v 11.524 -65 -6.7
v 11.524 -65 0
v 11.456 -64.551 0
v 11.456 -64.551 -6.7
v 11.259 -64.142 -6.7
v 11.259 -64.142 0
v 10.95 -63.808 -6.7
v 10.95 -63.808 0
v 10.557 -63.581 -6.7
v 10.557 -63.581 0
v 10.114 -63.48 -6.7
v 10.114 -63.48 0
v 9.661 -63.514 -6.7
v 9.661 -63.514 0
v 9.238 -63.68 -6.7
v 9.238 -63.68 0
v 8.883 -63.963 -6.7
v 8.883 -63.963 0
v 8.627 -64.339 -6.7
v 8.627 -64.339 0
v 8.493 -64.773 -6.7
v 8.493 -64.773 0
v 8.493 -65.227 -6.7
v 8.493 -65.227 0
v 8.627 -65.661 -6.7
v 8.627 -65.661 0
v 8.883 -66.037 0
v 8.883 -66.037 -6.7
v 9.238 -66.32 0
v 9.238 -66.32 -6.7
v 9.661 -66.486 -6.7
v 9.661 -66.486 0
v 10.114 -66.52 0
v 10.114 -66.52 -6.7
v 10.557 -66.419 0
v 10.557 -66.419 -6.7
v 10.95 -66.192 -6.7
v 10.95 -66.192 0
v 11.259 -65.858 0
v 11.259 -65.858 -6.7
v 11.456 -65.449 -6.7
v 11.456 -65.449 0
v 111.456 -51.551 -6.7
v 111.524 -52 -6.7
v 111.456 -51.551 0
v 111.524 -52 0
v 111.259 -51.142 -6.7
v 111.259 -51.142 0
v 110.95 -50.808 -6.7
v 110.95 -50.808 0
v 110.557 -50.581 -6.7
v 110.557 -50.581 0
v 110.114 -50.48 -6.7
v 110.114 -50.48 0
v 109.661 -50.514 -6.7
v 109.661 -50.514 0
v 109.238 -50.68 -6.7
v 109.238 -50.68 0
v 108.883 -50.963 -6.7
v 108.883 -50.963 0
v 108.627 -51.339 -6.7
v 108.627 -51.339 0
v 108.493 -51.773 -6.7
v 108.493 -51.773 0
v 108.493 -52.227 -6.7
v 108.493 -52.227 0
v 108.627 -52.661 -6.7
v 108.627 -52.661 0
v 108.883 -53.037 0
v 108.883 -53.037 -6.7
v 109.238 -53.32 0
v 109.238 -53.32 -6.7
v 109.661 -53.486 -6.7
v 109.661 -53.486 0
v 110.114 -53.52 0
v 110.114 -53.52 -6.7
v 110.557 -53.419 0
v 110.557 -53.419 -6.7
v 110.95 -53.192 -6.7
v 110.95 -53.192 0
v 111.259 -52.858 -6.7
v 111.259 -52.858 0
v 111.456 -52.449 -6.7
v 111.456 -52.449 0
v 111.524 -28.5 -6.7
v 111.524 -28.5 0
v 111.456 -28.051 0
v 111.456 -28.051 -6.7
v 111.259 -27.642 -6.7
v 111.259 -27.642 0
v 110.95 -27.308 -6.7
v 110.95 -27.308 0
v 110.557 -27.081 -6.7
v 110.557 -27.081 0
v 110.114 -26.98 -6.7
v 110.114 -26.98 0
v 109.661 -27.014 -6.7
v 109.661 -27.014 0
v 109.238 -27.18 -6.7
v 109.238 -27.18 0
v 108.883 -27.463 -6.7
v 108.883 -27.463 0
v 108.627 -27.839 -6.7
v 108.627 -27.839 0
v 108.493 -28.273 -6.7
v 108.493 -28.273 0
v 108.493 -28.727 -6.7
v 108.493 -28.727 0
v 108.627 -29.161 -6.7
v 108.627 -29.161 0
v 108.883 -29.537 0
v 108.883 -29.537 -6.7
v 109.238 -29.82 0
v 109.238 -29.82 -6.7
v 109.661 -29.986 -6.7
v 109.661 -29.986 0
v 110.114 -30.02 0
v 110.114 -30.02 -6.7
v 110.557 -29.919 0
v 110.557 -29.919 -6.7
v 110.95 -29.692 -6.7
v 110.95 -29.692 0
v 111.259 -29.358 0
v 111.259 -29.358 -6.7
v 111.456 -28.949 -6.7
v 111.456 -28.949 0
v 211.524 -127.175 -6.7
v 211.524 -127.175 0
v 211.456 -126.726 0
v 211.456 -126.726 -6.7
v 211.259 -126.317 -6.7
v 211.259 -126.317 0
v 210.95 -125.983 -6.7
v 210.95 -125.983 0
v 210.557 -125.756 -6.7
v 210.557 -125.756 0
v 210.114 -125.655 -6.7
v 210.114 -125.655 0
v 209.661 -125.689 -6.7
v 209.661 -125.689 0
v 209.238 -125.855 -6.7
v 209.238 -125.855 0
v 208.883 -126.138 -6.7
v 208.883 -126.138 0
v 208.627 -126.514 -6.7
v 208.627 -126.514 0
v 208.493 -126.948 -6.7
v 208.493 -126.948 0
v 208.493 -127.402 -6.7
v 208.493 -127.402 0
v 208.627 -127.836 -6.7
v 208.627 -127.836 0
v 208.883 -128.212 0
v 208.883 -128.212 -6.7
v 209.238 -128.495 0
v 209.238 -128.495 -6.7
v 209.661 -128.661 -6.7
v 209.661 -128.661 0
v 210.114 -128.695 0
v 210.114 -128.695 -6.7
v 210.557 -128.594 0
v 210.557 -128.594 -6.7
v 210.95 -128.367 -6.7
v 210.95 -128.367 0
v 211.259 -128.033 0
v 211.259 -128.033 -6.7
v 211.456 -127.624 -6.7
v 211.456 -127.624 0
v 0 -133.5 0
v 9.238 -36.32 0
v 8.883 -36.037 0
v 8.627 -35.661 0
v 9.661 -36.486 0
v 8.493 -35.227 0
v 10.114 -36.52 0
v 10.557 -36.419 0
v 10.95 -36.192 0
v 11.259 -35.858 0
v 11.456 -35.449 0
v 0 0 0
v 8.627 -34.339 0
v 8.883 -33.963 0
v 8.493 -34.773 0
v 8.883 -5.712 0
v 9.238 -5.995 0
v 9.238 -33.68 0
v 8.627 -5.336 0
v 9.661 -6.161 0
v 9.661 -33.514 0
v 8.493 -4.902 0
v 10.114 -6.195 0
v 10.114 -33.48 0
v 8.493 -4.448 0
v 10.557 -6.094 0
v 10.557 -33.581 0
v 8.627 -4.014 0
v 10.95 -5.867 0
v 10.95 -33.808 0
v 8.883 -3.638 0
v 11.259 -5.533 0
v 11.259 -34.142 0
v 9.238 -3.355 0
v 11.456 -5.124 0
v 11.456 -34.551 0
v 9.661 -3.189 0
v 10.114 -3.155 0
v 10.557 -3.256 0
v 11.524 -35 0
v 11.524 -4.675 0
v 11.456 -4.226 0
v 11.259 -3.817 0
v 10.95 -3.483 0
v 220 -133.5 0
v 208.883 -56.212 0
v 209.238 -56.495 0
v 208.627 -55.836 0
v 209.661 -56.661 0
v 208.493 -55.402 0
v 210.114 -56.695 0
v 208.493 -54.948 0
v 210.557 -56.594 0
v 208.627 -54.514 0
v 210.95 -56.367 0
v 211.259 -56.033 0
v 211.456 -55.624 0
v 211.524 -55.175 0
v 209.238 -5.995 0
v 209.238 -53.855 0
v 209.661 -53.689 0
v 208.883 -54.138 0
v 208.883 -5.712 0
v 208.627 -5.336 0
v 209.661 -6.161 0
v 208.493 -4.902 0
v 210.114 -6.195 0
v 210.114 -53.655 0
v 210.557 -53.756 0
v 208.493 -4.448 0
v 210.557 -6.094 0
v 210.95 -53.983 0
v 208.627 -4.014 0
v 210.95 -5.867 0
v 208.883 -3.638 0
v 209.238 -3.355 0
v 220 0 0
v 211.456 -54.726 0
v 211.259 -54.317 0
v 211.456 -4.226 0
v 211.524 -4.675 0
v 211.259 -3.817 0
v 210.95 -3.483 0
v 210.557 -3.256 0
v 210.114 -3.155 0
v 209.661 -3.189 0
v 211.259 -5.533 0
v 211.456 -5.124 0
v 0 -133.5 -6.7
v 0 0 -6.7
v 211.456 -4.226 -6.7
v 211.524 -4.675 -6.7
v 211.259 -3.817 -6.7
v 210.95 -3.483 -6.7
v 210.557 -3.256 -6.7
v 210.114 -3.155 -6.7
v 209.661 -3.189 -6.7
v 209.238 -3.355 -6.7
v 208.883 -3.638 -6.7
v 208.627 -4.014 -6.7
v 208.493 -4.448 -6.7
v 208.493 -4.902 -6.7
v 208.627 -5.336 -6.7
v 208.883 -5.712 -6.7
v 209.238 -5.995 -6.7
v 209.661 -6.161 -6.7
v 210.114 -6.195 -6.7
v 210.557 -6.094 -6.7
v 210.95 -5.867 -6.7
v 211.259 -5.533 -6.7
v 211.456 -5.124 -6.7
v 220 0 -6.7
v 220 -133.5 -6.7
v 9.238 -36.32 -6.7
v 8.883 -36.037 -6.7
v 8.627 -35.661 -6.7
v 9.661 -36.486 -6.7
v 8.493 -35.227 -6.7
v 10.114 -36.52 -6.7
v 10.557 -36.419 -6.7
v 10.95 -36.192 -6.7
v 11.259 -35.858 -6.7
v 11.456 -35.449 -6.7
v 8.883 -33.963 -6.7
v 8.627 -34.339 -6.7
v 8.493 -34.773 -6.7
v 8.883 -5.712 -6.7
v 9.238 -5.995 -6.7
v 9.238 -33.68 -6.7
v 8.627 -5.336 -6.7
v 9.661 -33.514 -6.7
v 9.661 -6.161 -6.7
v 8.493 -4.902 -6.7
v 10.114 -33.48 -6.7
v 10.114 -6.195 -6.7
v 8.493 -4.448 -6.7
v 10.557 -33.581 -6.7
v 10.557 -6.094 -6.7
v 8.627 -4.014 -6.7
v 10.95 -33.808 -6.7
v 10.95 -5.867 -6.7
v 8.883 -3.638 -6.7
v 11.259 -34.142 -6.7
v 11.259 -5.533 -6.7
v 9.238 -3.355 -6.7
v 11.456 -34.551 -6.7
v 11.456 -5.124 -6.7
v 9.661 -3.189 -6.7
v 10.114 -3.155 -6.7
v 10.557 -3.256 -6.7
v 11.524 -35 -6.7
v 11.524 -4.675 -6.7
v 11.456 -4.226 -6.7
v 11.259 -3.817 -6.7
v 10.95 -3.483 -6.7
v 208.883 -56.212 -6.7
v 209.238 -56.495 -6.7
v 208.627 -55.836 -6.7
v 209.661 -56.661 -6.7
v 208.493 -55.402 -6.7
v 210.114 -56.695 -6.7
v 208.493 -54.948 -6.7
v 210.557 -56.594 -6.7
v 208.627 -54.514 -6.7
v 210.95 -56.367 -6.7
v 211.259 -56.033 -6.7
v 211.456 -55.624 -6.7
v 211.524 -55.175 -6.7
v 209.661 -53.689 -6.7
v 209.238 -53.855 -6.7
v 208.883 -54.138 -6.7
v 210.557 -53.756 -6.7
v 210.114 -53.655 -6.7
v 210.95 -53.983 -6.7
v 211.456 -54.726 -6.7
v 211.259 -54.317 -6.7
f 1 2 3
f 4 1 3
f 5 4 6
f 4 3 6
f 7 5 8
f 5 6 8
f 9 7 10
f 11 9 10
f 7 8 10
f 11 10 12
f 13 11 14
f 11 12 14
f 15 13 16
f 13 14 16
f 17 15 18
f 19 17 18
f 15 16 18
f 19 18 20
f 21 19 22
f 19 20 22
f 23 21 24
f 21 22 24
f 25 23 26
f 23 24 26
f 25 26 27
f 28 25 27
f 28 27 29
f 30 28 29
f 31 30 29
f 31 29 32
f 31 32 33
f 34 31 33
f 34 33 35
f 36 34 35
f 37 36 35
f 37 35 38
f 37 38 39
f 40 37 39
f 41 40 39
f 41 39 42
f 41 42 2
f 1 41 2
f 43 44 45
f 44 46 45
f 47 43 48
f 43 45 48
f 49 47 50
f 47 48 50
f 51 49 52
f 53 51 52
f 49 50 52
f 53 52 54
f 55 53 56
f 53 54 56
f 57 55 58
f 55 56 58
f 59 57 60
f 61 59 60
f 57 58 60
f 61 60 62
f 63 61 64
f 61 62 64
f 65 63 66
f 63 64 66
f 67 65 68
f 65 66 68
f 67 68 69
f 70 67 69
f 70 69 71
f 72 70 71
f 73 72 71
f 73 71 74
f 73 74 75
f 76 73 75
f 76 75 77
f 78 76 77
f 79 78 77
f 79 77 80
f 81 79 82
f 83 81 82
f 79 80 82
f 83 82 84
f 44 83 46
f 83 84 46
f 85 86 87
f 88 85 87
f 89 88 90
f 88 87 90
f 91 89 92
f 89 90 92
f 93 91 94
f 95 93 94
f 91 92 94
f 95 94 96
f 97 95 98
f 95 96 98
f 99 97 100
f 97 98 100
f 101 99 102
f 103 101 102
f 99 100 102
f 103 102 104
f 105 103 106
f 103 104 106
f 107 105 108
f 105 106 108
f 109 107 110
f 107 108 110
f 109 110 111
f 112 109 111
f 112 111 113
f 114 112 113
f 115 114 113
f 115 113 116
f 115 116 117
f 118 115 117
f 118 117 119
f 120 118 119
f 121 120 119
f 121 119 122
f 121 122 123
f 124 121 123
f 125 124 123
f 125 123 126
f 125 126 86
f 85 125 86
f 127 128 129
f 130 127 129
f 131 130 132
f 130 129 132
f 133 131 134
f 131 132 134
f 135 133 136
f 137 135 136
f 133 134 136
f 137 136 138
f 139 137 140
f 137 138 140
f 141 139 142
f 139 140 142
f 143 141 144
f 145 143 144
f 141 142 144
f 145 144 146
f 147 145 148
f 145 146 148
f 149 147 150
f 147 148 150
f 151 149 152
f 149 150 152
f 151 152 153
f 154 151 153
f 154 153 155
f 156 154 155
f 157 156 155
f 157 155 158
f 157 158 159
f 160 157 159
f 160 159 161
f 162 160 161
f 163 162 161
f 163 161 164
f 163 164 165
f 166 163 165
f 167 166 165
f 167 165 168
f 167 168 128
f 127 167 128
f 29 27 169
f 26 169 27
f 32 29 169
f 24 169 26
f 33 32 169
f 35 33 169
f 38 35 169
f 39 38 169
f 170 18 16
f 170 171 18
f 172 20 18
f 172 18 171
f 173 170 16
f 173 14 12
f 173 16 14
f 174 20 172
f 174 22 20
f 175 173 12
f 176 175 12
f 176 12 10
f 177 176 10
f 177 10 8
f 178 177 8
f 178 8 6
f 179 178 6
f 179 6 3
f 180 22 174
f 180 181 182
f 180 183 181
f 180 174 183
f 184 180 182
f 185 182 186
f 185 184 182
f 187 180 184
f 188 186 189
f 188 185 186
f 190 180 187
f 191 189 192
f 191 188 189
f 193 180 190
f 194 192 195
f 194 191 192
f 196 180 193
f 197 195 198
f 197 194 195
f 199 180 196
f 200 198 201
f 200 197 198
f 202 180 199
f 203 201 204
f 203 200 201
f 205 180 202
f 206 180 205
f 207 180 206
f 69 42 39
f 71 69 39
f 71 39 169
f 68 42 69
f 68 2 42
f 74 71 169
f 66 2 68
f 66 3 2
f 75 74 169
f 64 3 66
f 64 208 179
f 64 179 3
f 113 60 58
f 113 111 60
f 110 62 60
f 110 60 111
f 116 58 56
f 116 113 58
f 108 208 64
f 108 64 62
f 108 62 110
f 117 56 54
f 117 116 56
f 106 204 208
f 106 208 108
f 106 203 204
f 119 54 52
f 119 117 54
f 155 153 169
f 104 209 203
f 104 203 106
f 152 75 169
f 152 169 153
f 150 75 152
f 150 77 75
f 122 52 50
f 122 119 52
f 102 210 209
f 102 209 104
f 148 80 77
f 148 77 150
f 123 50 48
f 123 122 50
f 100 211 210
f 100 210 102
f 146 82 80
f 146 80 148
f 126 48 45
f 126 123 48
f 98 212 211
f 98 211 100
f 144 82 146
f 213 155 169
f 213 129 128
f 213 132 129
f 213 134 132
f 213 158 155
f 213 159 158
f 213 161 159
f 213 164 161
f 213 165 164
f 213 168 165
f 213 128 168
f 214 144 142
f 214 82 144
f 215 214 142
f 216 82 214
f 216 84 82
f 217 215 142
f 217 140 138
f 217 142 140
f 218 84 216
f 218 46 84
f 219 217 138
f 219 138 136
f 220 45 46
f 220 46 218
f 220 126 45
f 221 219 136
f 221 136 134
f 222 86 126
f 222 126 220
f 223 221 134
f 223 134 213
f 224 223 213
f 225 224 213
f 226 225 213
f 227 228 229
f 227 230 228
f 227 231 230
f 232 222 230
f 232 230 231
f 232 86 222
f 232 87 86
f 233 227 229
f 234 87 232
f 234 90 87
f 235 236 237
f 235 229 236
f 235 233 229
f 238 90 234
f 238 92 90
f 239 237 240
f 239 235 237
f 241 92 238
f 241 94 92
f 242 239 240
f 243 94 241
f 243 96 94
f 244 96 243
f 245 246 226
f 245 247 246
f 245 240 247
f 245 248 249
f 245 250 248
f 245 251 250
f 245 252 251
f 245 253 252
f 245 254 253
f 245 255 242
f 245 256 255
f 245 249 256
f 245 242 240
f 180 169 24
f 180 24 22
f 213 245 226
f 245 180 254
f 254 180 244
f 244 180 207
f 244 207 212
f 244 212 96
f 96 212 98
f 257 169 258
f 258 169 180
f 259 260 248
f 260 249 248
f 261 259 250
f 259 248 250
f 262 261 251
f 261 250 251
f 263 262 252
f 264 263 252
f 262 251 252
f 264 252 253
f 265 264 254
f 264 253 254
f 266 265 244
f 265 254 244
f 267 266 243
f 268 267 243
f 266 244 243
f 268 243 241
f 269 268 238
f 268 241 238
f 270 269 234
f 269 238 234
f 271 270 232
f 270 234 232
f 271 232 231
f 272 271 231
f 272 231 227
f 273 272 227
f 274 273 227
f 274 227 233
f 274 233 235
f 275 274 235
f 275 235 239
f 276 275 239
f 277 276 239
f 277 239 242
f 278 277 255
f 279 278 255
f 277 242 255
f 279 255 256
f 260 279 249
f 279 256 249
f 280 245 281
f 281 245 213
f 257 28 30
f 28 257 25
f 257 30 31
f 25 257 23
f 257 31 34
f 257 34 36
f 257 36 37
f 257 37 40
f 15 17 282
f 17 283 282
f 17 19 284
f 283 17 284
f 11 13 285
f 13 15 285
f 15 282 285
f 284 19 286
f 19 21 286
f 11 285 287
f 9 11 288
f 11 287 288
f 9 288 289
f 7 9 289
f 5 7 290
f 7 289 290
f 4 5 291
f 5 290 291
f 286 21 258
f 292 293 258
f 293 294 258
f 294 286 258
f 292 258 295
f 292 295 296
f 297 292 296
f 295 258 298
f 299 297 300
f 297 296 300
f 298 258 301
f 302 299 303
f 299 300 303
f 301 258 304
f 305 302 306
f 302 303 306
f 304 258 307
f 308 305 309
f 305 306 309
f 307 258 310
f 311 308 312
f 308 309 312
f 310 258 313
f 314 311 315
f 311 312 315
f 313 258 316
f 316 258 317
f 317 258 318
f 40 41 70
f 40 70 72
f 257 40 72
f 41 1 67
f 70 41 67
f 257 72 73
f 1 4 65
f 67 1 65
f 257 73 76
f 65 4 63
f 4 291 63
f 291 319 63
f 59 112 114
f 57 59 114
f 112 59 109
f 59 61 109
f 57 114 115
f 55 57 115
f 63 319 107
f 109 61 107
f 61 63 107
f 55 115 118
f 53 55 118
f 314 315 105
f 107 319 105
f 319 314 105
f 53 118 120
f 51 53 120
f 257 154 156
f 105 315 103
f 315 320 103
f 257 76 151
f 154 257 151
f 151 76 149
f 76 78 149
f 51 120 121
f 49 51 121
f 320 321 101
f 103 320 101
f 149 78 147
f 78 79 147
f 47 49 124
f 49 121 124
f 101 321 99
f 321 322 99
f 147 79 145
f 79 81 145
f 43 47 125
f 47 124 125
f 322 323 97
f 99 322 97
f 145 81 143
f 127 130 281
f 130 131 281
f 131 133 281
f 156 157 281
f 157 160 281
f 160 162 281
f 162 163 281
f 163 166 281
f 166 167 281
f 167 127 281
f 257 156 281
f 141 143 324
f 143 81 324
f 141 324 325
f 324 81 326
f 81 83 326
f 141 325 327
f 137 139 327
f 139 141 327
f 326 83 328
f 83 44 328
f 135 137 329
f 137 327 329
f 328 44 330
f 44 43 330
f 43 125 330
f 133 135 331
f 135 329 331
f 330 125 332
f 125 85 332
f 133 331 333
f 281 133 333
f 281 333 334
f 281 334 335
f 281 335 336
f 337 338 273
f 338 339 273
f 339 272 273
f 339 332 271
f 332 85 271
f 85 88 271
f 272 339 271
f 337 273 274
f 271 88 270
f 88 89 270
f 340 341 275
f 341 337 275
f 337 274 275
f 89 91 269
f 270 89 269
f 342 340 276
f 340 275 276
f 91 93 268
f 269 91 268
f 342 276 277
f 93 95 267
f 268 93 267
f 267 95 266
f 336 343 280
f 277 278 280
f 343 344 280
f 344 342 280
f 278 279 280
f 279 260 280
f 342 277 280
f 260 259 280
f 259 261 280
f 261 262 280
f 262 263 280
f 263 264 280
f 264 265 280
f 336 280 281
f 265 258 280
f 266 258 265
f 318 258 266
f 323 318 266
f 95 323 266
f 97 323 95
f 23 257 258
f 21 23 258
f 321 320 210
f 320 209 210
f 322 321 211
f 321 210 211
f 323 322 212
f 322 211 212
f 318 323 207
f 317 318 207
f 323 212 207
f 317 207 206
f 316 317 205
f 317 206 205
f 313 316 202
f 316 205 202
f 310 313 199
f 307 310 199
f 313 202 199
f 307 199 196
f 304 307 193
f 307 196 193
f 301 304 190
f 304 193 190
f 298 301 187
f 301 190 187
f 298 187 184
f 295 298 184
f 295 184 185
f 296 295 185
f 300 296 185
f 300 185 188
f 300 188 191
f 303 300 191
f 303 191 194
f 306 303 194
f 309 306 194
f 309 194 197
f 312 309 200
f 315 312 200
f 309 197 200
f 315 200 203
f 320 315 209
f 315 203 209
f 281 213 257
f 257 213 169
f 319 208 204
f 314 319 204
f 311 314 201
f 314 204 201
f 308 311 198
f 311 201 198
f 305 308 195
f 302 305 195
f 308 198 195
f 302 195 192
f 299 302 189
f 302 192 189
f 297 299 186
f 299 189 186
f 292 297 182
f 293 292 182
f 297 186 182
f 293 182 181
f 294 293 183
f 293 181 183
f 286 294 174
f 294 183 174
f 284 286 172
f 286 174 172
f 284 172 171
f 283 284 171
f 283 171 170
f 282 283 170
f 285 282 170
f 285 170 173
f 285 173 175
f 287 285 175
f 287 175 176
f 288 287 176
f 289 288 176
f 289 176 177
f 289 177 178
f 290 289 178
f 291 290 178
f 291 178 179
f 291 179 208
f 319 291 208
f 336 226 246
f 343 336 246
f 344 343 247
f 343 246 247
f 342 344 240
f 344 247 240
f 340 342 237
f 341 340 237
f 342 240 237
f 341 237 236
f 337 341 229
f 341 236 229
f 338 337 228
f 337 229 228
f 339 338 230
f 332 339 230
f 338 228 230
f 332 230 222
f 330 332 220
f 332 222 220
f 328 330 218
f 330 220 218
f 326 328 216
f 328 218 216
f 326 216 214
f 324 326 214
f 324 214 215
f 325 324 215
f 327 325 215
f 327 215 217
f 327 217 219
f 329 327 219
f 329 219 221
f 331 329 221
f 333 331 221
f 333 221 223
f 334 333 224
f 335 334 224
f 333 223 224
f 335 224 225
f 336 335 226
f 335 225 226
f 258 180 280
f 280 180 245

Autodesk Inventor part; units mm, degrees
ref_plane "YZ Plane" through (0, 0, 0) normal (1, 0, 0) x (0, 1, 0)
ref_plane "XZ Plane" through (0, 0, 0) normal (0, 1, 0) x (-1, 0, 0)
ref_plane "XY Plane" through (0, 0, 0) normal (0, 0, 1) x (1, 0, 0)
sketch "Esquisse1" plane through (0, 0, 0) normal (0, 0, 1) x (1, 0, 0)
  line L0 (0, 0) -> (220, 0)
  line L1 (220, 0) -> (220, -133.5)
  line L2 (220, -133.5) -> (0, -133.5)
  line L3 (0, -133.5) -> (0, 0)
  dimension "d0" = 220
  dimension "d1" = 133.5
extrude "Extrusion1" add sketch "Esquisse1" against normal blind 6.7
sketch "Esquisse2" plane through (0, 0, 0) normal (0, 0, 1) x (1, 0, 0)
  circle A0 centre (10, -4.675) radius 1.524
  circle A1 centre (10, -35) radius 1.524
  circle A2 centre (10, -65) radius 1.524
  circle A3 centre (110, -28.5) radius 1.524
  circle A4 centre (110, -52) radius 1.524
  circle A5 centre (210, -4.675) radius 1.524
  circle A6 centre (210, -55.175) radius 1.524
  circle A7 centre (210, -127.175) radius 1.524
  line L0 (0, 0) -> (0, -133.5) projected
  line L1 (220, 0) -> (0, 0) projected
  line L2 (220, -133.5) -> (220, 0) projected
  dimension "d4" = 3.048
  dimension "d5" = 10
  dimension "d6" = 4.675
  dimension "d7" = 4.675
  dimension "d8" = 10
  dimension "d9" = 10
  dimension "d10" = 10
  dimension "d13" = 10
  dimension "d14" = 10
  dimension "d15" = 30
  dimension "d16" = 30.325
  dimension "d17" = 50.5
  dimension "d18" = 72
  dimension "d19" = 28.5
  dimension "d20" = 23.5
  dimension "d23" = 110
  dimension "d24" = 110
extrude "Extrusion2" cut sketch "Esquisse2" against normal through all
properties part number "Validation_jig_top"
